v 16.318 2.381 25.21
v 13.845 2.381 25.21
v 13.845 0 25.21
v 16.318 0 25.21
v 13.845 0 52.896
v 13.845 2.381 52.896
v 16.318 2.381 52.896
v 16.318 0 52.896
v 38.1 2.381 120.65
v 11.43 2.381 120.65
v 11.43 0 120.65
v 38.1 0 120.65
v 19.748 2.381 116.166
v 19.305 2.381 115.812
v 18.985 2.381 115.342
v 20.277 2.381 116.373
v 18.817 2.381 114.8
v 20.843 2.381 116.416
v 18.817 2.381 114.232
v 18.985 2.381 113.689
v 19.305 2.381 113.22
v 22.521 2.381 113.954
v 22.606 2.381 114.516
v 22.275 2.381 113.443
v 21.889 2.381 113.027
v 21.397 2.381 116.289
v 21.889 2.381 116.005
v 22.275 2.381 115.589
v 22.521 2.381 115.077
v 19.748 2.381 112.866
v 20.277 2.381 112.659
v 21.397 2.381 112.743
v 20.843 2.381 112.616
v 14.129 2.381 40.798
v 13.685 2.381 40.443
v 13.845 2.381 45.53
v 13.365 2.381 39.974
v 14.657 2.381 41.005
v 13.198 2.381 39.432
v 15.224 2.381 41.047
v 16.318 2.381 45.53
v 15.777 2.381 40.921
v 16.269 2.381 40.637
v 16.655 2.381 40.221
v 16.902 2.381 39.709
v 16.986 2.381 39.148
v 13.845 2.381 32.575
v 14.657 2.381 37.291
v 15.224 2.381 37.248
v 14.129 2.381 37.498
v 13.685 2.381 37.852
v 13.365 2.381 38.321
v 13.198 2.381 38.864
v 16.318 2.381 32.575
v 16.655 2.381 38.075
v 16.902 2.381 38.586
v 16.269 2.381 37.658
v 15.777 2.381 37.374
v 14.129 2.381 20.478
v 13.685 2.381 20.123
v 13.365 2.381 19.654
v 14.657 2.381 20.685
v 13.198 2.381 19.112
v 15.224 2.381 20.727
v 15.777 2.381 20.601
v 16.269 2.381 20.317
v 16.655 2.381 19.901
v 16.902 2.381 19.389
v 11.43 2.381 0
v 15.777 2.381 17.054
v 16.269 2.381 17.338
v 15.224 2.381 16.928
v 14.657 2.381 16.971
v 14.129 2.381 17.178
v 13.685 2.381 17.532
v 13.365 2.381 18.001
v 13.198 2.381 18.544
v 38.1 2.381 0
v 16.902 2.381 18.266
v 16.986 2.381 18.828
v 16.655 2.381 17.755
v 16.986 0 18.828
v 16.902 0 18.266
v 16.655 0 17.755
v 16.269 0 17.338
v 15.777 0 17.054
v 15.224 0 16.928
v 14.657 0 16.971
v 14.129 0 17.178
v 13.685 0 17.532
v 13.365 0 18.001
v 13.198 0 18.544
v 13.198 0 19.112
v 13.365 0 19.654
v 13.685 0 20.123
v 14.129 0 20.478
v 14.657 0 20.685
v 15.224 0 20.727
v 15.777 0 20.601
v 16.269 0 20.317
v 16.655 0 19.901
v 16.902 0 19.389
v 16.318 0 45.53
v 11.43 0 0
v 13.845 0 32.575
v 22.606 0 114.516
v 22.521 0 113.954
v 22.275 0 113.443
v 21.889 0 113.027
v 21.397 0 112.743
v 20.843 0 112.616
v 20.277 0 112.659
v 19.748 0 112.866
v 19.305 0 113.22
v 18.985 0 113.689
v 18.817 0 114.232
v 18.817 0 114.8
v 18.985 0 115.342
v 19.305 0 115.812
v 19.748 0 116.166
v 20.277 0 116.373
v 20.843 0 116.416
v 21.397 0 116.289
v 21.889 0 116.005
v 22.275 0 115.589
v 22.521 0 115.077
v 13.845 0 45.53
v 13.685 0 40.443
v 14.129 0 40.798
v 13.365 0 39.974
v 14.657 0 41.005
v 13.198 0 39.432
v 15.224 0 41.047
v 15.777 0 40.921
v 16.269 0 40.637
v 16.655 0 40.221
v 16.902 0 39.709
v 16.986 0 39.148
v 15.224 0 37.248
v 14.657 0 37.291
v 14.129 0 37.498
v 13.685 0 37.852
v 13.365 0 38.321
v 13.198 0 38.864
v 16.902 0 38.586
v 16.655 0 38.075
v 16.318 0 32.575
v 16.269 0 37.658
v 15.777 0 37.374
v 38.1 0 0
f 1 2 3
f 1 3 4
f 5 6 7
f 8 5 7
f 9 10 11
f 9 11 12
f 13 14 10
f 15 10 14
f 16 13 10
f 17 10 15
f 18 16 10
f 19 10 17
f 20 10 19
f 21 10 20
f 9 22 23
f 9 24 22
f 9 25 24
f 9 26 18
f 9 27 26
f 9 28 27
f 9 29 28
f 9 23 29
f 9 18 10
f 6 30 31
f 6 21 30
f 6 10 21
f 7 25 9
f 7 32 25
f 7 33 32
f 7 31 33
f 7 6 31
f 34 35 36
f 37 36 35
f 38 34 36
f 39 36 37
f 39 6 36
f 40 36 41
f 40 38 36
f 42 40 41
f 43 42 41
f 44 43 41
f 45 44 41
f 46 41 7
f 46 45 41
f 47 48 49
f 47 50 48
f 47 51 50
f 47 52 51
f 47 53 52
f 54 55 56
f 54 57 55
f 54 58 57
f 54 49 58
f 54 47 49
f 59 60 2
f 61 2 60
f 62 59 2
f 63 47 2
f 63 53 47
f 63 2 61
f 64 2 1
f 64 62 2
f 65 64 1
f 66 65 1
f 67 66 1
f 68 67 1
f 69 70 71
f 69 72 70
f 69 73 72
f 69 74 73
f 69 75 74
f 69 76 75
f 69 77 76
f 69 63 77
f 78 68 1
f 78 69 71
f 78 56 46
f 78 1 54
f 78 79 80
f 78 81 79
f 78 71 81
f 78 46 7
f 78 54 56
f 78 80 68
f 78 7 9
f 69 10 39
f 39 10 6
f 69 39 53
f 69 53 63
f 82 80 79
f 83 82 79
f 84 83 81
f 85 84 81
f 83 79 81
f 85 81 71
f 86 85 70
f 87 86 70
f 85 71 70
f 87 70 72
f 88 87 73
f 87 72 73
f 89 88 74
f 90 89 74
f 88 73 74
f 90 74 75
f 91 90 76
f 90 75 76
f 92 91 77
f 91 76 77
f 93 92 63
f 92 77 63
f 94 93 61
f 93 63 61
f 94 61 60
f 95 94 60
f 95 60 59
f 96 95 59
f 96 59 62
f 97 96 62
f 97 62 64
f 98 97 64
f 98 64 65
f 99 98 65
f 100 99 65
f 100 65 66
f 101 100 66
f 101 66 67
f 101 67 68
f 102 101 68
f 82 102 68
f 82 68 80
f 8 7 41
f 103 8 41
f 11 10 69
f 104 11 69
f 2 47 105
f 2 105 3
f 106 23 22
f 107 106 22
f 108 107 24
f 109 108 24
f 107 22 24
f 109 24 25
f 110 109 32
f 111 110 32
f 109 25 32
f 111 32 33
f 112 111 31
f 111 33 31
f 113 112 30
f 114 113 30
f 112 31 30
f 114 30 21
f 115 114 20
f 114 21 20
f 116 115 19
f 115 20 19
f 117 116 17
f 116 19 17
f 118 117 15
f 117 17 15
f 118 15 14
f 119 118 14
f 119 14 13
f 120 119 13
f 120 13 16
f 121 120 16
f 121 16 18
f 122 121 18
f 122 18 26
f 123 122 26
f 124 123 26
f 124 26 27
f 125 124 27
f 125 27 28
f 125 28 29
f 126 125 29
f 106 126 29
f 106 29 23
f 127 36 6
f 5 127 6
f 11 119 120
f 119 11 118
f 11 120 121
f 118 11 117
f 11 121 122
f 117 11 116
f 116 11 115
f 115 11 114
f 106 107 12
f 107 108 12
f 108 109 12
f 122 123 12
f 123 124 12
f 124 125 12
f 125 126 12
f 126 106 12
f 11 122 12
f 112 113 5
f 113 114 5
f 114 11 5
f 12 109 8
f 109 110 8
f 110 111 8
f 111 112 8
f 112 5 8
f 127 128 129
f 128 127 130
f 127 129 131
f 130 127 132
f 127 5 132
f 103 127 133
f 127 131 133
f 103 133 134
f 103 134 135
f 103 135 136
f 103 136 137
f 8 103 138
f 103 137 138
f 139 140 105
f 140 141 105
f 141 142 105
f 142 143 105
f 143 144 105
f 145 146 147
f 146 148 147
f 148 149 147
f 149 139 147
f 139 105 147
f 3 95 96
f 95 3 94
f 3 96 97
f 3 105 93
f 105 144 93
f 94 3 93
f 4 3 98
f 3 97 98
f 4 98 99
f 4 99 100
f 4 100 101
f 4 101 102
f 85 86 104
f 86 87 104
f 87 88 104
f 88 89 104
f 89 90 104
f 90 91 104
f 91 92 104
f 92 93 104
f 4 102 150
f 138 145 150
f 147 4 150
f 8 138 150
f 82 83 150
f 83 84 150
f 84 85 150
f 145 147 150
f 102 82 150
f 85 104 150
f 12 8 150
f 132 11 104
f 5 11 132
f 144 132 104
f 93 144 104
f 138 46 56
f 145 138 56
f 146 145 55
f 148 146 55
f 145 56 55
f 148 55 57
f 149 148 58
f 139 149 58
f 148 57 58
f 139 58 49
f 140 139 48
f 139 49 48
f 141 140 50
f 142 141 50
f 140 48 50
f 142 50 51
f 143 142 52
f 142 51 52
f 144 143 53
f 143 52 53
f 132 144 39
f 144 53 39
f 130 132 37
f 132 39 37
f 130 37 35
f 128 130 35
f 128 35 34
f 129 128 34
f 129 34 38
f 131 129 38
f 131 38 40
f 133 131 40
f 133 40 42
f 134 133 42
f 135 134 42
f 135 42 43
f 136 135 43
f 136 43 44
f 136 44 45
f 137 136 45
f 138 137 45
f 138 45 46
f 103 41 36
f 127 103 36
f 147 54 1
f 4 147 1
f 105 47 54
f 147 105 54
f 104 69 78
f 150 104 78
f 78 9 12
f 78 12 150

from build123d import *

# Parameters (mm, degrees)
SKETCH1_W           = 19.05
SKETCH1_H           = 2.38125
BOSS_EXTRUDE1_DEPTH = 120.65
SKETCH8_W           = 19.05
SKETCH8_H           = 120.65
BOSS_EXTRUDE3_DEPTH = 2.38125
SKETCH9_R           = 1.905
CUT_EXTRUDE5_DEPTH  = 3.38125
SKETCH5_R           = 1.905
CUT_EXTRUDE6_DEPTH  = 2.54
SKETCH10_W          = 38.1
SKETCH10_H          = 29.6545
BOSS_EXTRUDE4_DEPTH = 2.38125
SKETCH12_W          = 11.43
SKETCH12_H          = 150.3045
CUT_EXTRUDE8_DEPTH  = 3.38125
SKETCH13_W          = 26.67
SKETCH13_H          = 29.6545
CUT_EXTRUDE9_DEPTH  = 3.38125


with BuildPart() as part:
    # Sketch1 → Boss-Extrude1 (new body)
    with BuildSketch(Plane.XY):
        with Locations((9.525, 1.190625)):
            Rectangle(SKETCH1_W, SKETCH1_H)
    extrude(amount=BOSS_EXTRUDE1_DEPTH)

    # Sketch8 → Boss-Extrude3 (add)
    with BuildSketch(Plane(origin=(0, 2.38125, 0), x_dir=(1, 0, 0), z_dir=(0, 1, 0))):
        with Locations((28.575, -60.325)):
            Rectangle(SKETCH8_W, SKETCH8_H)
    extrude(amount=-BOSS_EXTRUDE3_DEPTH)

    # Sketch9 → Cut-Extrude5 (cut, through all)
    with BuildSketch(Plane(origin=(0, 2.38125, 0), x_dir=(1, 0, 0), z_dir=(0, 1, 0))):
        with Locations((20.701, -114.5159)):
            Circle(SKETCH9_R)
    extrude(amount=-CUT_EXTRUDE5_DEPTH, mode=Mode.SUBTRACT)

    # Sketch5 → Cut-Extrude6 (cut)
    with BuildSketch(Plane(origin=(0, 2.38125, 0), x_dir=(1, 0, 0), z_dir=(0, 1, 0))):
        with Locations((15.08125, -39.14775)):
            Circle(SKETCH5_R)
        with Locations((15.08125, -18.82775)):
            Circle(SKETCH5_R)
        Polygon((16.317595, -28.98775), (16.317595, -32.5755), (15.08125, -32.5755), (13.844905, -32.5755), (13.844905, -25.2095), (16.317595, -25.2095), align=None)
        Polygon((15.08125, -52.8955), (16.317595, -52.8955), (16.317595, -45.5295), (13.844905, -45.5295), (13.844905, -52.8955), align=None)
    extrude(amount=-CUT_EXTRUDE6_DEPTH, mode=Mode.SUBTRACT)

    # Sketch10 → Boss-Extrude4 (add)
    with BuildSketch(Plane(origin=(0, 2.38125, 0), x_dir=(1, 0, 0), z_dir=(0, 1, 0))):
        with Locations((19.05, 14.82725)):
            Rectangle(SKETCH10_W, SKETCH10_H)
    extrude(amount=-BOSS_EXTRUDE4_DEPTH)

    # Sketch12 → Cut-Extrude8 (cut, through all)
    with BuildSketch(Plane(origin=(0, 2.38125, 0), x_dir=(1, 0, 0), z_dir=(0, 1, 0))):
        with Locations((5.715, -45.49775)):
            Rectangle(SKETCH12_W, SKETCH12_H)
    extrude(amount=-CUT_EXTRUDE8_DEPTH, mode=Mode.SUBTRACT)

    # Sketch13 → Cut-Extrude9 (cut, through all)
    with BuildSketch(Plane(origin=(0, 2.38125, 0), x_dir=(1, 0, 0), z_dir=(0, 1, 0))):
        with Locations((24.765, 14.82725)):
            Rectangle(SKETCH13_W, SKETCH13_H)
    extrude(amount=-CUT_EXTRUDE9_DEPTH, mode=Mode.SUBTRACT)


solid = part.part
